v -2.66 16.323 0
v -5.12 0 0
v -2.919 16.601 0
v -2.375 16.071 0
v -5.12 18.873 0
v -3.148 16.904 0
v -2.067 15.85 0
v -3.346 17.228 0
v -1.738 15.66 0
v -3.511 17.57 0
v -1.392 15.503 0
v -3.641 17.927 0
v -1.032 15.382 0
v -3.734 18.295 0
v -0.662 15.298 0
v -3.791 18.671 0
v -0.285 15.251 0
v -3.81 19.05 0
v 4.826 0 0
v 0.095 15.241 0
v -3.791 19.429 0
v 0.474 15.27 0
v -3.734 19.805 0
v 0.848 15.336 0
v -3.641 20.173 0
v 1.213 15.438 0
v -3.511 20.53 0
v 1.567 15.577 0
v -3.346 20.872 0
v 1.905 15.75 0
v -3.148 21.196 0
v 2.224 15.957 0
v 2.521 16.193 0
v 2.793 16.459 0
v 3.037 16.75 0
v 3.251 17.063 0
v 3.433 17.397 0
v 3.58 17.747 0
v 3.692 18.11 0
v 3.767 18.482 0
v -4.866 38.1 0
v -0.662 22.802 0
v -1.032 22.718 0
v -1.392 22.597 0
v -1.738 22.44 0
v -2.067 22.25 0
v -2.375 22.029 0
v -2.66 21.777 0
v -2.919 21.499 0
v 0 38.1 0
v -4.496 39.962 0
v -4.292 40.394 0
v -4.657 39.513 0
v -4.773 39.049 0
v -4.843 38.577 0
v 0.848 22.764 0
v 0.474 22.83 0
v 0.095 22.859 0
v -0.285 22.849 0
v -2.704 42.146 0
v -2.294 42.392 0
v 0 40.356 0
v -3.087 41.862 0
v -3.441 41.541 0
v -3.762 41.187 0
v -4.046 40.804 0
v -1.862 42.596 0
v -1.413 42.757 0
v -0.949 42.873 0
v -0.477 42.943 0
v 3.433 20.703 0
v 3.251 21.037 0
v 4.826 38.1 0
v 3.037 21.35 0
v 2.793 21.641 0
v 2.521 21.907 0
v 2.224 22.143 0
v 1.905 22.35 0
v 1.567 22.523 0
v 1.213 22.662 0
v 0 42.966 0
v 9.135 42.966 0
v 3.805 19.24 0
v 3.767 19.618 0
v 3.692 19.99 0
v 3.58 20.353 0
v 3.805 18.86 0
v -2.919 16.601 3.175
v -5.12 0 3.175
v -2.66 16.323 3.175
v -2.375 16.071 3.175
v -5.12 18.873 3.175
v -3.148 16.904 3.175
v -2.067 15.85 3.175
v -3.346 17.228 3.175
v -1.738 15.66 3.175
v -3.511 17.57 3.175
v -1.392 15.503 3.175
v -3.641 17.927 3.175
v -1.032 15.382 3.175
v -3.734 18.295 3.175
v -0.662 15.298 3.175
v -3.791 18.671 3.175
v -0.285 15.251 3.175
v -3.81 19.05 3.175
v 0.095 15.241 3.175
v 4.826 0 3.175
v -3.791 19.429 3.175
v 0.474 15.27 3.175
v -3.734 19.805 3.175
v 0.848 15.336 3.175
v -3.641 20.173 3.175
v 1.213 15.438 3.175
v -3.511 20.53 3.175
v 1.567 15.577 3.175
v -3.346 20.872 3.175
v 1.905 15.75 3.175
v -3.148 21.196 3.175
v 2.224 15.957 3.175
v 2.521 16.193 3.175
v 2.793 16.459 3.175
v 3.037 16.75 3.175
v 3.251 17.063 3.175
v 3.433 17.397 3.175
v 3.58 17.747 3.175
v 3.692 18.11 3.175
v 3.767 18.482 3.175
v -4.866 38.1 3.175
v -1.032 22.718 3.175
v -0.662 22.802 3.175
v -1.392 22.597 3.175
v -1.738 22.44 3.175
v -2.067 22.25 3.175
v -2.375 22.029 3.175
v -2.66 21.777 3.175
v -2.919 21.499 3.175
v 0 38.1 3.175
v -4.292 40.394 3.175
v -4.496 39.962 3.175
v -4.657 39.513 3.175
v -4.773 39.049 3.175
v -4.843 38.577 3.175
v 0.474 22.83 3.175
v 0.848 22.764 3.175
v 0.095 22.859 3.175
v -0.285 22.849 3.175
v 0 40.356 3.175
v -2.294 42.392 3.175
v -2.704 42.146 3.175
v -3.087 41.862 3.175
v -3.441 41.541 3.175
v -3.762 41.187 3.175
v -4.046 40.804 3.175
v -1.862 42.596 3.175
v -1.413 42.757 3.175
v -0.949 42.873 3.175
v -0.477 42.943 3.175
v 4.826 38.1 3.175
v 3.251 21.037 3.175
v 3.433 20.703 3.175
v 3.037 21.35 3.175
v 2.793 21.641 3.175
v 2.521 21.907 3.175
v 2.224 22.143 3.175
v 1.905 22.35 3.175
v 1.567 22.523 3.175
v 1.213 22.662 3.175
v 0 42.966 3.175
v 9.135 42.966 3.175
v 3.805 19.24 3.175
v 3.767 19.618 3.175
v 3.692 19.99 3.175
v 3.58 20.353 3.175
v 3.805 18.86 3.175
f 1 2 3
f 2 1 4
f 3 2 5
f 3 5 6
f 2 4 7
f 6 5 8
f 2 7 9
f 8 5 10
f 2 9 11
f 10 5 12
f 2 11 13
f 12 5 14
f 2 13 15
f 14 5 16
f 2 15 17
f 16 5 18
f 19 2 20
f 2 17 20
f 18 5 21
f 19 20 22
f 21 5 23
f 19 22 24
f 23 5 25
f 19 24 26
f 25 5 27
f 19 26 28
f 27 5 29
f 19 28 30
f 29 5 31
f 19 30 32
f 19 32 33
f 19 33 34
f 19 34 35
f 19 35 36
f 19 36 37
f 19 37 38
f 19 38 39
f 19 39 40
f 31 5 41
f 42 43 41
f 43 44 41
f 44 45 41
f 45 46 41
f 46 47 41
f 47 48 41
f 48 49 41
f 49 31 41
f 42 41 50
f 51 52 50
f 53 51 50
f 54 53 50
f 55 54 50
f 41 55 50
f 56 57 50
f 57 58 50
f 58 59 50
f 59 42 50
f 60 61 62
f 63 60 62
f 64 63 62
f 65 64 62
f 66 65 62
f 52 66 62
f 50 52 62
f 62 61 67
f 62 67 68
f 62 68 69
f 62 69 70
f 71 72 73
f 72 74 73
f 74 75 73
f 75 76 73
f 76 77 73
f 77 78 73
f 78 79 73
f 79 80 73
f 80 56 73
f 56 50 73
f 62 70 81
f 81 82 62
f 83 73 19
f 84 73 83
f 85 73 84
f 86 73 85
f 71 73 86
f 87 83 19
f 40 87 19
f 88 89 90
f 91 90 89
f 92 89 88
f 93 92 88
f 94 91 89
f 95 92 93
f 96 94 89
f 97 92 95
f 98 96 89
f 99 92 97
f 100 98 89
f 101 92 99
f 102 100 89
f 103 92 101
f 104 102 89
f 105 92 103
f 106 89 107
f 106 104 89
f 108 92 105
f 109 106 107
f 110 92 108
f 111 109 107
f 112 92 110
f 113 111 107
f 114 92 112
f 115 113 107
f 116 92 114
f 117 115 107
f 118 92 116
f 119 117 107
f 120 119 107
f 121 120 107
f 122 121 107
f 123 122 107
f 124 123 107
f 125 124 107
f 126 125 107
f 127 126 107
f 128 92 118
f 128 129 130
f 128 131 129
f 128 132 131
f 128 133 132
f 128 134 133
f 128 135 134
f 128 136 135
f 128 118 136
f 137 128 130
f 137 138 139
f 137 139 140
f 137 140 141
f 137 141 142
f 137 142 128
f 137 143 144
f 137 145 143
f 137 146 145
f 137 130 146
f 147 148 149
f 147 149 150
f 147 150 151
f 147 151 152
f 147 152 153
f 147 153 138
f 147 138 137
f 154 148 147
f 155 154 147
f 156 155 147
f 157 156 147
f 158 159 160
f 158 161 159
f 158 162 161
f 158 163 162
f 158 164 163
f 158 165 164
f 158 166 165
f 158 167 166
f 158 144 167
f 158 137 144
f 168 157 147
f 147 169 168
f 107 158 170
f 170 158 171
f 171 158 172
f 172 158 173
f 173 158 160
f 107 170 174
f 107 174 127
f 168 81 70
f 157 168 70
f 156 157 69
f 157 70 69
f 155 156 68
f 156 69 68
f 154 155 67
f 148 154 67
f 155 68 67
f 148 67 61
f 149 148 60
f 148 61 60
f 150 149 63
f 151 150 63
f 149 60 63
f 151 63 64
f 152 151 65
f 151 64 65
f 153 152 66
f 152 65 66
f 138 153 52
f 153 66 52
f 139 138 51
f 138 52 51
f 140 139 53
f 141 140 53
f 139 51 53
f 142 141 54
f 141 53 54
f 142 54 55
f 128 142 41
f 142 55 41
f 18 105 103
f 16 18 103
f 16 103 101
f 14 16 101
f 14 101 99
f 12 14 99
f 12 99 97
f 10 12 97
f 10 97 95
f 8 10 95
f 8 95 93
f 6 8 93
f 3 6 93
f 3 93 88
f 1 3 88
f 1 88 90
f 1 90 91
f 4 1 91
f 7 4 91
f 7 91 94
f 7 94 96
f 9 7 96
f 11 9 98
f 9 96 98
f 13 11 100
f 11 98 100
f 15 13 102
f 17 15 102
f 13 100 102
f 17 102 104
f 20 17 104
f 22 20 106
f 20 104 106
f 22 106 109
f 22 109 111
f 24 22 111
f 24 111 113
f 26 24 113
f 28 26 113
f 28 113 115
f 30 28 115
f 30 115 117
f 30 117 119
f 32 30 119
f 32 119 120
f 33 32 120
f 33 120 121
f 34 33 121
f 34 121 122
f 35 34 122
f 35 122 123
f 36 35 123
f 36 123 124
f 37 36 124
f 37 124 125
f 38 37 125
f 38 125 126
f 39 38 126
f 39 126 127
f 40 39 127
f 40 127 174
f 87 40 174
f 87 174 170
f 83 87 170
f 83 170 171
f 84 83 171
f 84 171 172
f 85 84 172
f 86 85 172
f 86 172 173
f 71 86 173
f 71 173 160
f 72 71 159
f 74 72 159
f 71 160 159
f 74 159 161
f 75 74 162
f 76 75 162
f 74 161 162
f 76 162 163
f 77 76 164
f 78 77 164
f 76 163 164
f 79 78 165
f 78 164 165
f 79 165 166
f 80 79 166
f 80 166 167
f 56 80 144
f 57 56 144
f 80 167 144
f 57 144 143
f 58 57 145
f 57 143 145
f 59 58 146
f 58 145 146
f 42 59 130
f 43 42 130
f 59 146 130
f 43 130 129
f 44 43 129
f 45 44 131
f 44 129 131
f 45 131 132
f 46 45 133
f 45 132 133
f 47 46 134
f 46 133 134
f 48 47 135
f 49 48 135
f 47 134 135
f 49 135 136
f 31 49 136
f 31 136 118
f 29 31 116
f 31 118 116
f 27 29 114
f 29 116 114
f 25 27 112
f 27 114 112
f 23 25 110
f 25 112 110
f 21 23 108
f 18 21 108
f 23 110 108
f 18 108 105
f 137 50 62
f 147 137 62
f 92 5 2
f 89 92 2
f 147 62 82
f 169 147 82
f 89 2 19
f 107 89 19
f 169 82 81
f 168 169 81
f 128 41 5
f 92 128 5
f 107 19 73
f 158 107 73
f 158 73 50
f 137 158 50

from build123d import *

# Parameters (mm, degrees)
F1_DEPTH = 3.175
F2_DEPTH = 25.4
F3_D     = 7.62


with BuildPart() as f1:
    # F0 (on Top) → F1 (new body)
    with BuildSketch(Plane.XY):
        with BuildLine():
            Line((-5.1198361907, 0), (0, 0))
            Line((0, 0), (0, 14.0471234521))
            ThreePointArc((0, 14.0471234521), (-4.826, 18.8731234521), (0, 23.6991234521))
            Line((0, 23.6991234521), (0, 38.1))
            Line((0, 38.1), (0, 40.3563641012))
            Line((0, 40.3563641012), (9.1353934258, 42.9664775729))
            Line((9.1353934258, 42.9664775729), (0, 42.9664775729))
            ThreePointArc((0, 42.9664775729), (-3.4411192923, 41.5411192923), (-4.8664775729, 38.1))
            Line((-4.8664775729, 38.1), (-5.1198361907, 18.8731234521))
            Line((-5.1198361907, 18.8731234521), (-5.1198361907, 0))
        make_face()
        with BuildLine():
            Line((0, 38.1), (0, 23.6991234521))
            ThreePointArc((0, 23.6991234521), (3.412497326, 22.2856207781), (4.826, 18.8731234521))
            Line((4.826, 18.8731234521), (4.826, 38.1))
            Line((4.826, 38.1), (0, 38.1))
        make_face()
        with BuildLine():
            Line((0, 19.05), (0, 14.0471234521))
            ThreePointArc((0, 14.0471234521), (3.412497326, 15.4606261261), (4.826, 18.8731234521))
            ThreePointArc((4.826, 18.8731234521), (3.412497326, 22.2856207781), (0, 23.6991234521))
            Line((0, 23.6991234521), (0, 19.05))
        make_face()
        with BuildLine():
            ThreePointArc((0, 23.6991234521), (-4.826, 18.8731234521), (0, 14.0471234521))
            Line((0, 14.0471234521), (0, 19.05))
            Line((0, 19.05), (0, 23.6991234521))
        make_face()
        with BuildLine():
            Line((0, 14.0471234521), (0, 0))
            Line((0, 0), (4.826, 0))
            Line((4.826, 0), (4.826, 4.826))
            Line((4.826, 4.826), (4.826, 18.8731234521))
            ThreePointArc((4.826, 18.8731234521), (3.412497326, 15.4606261261), (0, 14.0471234521))
        make_face()
    extrude(amount=F1_DEPTH)

    # F0 (on Top) + F1_face (on face) → F2 (cut)
    with BuildSketch(Plane.XY):
        with BuildLine():
            Line((-5.1198361907, 0), (0, 0))
            Line((0, 0), (0, 14.0471234521))
            ThreePointArc((0, 14.0471234521), (-4.826, 18.8731234521), (0, 23.6991234521))
            Line((0, 23.6991234521), (0, 38.1))
            Line((0, 38.1), (0, 40.3563641012))
            Line((0, 40.3563641012), (9.1353934258, 42.9664775729))
            Line((9.1353934258, 42.9664775729), (0, 42.9664775729))
            ThreePointArc((0, 42.9664775729), (-3.4411192923, 41.5411192923), (-4.8664775729, 38.1))
            Line((-4.8664775729, 38.1), (-5.1198361907, 18.8731234521))
            Line((-5.1198361907, 18.8731234521), (-5.1198361907, 0))
        make_face()
        with BuildLine():
            Line((0, 14.0471234521), (0, 0))
            Line((0, 0), (4.826, 0))
            Line((4.826, 0), (4.826, 4.826))
            Line((4.826, 4.826), (4.826, 18.8731234521))
            ThreePointArc((4.826, 18.8731234521), (3.412497326, 15.4606261261), (0, 14.0471234521))
        make_face()
        with BuildLine():
            Line((0, 19.05), (0, 14.0471234521))
            ThreePointArc((0, 14.0471234521), (3.412497326, 15.4606261261), (4.826, 18.8731234521))
            ThreePointArc((4.826, 18.8731234521), (3.412497326, 22.2856207781), (0, 23.6991234521))
            Line((0, 23.6991234521), (0, 19.05))
        make_face()
        with BuildLine():
            Line((0, 38.1), (0, 23.6991234521))
            ThreePointArc((0, 23.6991234521), (3.412497326, 22.2856207781), (4.826, 18.8731234521))
            Line((4.826, 18.8731234521), (4.826, 38.1))
            Line((4.826, 38.1), (0, 38.1))
        make_face()
    with BuildSketch(Plane(origin=(-0.1118375102, 20.6143518091, 0), x_dir=(1, 0, 0), z_dir=(0, 0, -1))):
        with BuildLine():
            Line((0.1118375102, -17.4856481909), (4.9378375102, -17.4856481909))
            Line((4.9378375102, -17.4856481909), (4.9378375102, 20.6143518091))
            Line((4.9378375102, 20.6143518091), (-5.0079986805, 20.6143518091))
            Line((-5.0079986805, 20.6143518091), (-5.0079986805, 1.741228357))
            Line((-5.0079986805, 1.741228357), (-4.7546400627, -17.4856481909))
            ThreePointArc((-4.7546400627, -17.4856481909), (-3.3292817821, -20.9267674832), (0.1118375102, -22.3521257638))
            Line((0.1118375102, -22.3521257638), (9.247230936, -22.3521257638))
            Line((9.247230936, -22.3521257638), (0.1118375102, -19.7420122921))
            Line((0.1118375102, -19.7420122921), (0.1118375102, -17.4856481909))
        make_face()
    extrude(amount=-F2_DEPTH, dir=(0, 0, 1), mode=Mode.SUBTRACT)

    # F3 (through all)
    with Locations(Plane(origin=(0, 0, 0), x_dir=(1, 0, 0), z_dir=(0, 0, -1))):
        with Locations((0, -19.05)):
            Hole(F3_D / 2)


solid = f1.part
